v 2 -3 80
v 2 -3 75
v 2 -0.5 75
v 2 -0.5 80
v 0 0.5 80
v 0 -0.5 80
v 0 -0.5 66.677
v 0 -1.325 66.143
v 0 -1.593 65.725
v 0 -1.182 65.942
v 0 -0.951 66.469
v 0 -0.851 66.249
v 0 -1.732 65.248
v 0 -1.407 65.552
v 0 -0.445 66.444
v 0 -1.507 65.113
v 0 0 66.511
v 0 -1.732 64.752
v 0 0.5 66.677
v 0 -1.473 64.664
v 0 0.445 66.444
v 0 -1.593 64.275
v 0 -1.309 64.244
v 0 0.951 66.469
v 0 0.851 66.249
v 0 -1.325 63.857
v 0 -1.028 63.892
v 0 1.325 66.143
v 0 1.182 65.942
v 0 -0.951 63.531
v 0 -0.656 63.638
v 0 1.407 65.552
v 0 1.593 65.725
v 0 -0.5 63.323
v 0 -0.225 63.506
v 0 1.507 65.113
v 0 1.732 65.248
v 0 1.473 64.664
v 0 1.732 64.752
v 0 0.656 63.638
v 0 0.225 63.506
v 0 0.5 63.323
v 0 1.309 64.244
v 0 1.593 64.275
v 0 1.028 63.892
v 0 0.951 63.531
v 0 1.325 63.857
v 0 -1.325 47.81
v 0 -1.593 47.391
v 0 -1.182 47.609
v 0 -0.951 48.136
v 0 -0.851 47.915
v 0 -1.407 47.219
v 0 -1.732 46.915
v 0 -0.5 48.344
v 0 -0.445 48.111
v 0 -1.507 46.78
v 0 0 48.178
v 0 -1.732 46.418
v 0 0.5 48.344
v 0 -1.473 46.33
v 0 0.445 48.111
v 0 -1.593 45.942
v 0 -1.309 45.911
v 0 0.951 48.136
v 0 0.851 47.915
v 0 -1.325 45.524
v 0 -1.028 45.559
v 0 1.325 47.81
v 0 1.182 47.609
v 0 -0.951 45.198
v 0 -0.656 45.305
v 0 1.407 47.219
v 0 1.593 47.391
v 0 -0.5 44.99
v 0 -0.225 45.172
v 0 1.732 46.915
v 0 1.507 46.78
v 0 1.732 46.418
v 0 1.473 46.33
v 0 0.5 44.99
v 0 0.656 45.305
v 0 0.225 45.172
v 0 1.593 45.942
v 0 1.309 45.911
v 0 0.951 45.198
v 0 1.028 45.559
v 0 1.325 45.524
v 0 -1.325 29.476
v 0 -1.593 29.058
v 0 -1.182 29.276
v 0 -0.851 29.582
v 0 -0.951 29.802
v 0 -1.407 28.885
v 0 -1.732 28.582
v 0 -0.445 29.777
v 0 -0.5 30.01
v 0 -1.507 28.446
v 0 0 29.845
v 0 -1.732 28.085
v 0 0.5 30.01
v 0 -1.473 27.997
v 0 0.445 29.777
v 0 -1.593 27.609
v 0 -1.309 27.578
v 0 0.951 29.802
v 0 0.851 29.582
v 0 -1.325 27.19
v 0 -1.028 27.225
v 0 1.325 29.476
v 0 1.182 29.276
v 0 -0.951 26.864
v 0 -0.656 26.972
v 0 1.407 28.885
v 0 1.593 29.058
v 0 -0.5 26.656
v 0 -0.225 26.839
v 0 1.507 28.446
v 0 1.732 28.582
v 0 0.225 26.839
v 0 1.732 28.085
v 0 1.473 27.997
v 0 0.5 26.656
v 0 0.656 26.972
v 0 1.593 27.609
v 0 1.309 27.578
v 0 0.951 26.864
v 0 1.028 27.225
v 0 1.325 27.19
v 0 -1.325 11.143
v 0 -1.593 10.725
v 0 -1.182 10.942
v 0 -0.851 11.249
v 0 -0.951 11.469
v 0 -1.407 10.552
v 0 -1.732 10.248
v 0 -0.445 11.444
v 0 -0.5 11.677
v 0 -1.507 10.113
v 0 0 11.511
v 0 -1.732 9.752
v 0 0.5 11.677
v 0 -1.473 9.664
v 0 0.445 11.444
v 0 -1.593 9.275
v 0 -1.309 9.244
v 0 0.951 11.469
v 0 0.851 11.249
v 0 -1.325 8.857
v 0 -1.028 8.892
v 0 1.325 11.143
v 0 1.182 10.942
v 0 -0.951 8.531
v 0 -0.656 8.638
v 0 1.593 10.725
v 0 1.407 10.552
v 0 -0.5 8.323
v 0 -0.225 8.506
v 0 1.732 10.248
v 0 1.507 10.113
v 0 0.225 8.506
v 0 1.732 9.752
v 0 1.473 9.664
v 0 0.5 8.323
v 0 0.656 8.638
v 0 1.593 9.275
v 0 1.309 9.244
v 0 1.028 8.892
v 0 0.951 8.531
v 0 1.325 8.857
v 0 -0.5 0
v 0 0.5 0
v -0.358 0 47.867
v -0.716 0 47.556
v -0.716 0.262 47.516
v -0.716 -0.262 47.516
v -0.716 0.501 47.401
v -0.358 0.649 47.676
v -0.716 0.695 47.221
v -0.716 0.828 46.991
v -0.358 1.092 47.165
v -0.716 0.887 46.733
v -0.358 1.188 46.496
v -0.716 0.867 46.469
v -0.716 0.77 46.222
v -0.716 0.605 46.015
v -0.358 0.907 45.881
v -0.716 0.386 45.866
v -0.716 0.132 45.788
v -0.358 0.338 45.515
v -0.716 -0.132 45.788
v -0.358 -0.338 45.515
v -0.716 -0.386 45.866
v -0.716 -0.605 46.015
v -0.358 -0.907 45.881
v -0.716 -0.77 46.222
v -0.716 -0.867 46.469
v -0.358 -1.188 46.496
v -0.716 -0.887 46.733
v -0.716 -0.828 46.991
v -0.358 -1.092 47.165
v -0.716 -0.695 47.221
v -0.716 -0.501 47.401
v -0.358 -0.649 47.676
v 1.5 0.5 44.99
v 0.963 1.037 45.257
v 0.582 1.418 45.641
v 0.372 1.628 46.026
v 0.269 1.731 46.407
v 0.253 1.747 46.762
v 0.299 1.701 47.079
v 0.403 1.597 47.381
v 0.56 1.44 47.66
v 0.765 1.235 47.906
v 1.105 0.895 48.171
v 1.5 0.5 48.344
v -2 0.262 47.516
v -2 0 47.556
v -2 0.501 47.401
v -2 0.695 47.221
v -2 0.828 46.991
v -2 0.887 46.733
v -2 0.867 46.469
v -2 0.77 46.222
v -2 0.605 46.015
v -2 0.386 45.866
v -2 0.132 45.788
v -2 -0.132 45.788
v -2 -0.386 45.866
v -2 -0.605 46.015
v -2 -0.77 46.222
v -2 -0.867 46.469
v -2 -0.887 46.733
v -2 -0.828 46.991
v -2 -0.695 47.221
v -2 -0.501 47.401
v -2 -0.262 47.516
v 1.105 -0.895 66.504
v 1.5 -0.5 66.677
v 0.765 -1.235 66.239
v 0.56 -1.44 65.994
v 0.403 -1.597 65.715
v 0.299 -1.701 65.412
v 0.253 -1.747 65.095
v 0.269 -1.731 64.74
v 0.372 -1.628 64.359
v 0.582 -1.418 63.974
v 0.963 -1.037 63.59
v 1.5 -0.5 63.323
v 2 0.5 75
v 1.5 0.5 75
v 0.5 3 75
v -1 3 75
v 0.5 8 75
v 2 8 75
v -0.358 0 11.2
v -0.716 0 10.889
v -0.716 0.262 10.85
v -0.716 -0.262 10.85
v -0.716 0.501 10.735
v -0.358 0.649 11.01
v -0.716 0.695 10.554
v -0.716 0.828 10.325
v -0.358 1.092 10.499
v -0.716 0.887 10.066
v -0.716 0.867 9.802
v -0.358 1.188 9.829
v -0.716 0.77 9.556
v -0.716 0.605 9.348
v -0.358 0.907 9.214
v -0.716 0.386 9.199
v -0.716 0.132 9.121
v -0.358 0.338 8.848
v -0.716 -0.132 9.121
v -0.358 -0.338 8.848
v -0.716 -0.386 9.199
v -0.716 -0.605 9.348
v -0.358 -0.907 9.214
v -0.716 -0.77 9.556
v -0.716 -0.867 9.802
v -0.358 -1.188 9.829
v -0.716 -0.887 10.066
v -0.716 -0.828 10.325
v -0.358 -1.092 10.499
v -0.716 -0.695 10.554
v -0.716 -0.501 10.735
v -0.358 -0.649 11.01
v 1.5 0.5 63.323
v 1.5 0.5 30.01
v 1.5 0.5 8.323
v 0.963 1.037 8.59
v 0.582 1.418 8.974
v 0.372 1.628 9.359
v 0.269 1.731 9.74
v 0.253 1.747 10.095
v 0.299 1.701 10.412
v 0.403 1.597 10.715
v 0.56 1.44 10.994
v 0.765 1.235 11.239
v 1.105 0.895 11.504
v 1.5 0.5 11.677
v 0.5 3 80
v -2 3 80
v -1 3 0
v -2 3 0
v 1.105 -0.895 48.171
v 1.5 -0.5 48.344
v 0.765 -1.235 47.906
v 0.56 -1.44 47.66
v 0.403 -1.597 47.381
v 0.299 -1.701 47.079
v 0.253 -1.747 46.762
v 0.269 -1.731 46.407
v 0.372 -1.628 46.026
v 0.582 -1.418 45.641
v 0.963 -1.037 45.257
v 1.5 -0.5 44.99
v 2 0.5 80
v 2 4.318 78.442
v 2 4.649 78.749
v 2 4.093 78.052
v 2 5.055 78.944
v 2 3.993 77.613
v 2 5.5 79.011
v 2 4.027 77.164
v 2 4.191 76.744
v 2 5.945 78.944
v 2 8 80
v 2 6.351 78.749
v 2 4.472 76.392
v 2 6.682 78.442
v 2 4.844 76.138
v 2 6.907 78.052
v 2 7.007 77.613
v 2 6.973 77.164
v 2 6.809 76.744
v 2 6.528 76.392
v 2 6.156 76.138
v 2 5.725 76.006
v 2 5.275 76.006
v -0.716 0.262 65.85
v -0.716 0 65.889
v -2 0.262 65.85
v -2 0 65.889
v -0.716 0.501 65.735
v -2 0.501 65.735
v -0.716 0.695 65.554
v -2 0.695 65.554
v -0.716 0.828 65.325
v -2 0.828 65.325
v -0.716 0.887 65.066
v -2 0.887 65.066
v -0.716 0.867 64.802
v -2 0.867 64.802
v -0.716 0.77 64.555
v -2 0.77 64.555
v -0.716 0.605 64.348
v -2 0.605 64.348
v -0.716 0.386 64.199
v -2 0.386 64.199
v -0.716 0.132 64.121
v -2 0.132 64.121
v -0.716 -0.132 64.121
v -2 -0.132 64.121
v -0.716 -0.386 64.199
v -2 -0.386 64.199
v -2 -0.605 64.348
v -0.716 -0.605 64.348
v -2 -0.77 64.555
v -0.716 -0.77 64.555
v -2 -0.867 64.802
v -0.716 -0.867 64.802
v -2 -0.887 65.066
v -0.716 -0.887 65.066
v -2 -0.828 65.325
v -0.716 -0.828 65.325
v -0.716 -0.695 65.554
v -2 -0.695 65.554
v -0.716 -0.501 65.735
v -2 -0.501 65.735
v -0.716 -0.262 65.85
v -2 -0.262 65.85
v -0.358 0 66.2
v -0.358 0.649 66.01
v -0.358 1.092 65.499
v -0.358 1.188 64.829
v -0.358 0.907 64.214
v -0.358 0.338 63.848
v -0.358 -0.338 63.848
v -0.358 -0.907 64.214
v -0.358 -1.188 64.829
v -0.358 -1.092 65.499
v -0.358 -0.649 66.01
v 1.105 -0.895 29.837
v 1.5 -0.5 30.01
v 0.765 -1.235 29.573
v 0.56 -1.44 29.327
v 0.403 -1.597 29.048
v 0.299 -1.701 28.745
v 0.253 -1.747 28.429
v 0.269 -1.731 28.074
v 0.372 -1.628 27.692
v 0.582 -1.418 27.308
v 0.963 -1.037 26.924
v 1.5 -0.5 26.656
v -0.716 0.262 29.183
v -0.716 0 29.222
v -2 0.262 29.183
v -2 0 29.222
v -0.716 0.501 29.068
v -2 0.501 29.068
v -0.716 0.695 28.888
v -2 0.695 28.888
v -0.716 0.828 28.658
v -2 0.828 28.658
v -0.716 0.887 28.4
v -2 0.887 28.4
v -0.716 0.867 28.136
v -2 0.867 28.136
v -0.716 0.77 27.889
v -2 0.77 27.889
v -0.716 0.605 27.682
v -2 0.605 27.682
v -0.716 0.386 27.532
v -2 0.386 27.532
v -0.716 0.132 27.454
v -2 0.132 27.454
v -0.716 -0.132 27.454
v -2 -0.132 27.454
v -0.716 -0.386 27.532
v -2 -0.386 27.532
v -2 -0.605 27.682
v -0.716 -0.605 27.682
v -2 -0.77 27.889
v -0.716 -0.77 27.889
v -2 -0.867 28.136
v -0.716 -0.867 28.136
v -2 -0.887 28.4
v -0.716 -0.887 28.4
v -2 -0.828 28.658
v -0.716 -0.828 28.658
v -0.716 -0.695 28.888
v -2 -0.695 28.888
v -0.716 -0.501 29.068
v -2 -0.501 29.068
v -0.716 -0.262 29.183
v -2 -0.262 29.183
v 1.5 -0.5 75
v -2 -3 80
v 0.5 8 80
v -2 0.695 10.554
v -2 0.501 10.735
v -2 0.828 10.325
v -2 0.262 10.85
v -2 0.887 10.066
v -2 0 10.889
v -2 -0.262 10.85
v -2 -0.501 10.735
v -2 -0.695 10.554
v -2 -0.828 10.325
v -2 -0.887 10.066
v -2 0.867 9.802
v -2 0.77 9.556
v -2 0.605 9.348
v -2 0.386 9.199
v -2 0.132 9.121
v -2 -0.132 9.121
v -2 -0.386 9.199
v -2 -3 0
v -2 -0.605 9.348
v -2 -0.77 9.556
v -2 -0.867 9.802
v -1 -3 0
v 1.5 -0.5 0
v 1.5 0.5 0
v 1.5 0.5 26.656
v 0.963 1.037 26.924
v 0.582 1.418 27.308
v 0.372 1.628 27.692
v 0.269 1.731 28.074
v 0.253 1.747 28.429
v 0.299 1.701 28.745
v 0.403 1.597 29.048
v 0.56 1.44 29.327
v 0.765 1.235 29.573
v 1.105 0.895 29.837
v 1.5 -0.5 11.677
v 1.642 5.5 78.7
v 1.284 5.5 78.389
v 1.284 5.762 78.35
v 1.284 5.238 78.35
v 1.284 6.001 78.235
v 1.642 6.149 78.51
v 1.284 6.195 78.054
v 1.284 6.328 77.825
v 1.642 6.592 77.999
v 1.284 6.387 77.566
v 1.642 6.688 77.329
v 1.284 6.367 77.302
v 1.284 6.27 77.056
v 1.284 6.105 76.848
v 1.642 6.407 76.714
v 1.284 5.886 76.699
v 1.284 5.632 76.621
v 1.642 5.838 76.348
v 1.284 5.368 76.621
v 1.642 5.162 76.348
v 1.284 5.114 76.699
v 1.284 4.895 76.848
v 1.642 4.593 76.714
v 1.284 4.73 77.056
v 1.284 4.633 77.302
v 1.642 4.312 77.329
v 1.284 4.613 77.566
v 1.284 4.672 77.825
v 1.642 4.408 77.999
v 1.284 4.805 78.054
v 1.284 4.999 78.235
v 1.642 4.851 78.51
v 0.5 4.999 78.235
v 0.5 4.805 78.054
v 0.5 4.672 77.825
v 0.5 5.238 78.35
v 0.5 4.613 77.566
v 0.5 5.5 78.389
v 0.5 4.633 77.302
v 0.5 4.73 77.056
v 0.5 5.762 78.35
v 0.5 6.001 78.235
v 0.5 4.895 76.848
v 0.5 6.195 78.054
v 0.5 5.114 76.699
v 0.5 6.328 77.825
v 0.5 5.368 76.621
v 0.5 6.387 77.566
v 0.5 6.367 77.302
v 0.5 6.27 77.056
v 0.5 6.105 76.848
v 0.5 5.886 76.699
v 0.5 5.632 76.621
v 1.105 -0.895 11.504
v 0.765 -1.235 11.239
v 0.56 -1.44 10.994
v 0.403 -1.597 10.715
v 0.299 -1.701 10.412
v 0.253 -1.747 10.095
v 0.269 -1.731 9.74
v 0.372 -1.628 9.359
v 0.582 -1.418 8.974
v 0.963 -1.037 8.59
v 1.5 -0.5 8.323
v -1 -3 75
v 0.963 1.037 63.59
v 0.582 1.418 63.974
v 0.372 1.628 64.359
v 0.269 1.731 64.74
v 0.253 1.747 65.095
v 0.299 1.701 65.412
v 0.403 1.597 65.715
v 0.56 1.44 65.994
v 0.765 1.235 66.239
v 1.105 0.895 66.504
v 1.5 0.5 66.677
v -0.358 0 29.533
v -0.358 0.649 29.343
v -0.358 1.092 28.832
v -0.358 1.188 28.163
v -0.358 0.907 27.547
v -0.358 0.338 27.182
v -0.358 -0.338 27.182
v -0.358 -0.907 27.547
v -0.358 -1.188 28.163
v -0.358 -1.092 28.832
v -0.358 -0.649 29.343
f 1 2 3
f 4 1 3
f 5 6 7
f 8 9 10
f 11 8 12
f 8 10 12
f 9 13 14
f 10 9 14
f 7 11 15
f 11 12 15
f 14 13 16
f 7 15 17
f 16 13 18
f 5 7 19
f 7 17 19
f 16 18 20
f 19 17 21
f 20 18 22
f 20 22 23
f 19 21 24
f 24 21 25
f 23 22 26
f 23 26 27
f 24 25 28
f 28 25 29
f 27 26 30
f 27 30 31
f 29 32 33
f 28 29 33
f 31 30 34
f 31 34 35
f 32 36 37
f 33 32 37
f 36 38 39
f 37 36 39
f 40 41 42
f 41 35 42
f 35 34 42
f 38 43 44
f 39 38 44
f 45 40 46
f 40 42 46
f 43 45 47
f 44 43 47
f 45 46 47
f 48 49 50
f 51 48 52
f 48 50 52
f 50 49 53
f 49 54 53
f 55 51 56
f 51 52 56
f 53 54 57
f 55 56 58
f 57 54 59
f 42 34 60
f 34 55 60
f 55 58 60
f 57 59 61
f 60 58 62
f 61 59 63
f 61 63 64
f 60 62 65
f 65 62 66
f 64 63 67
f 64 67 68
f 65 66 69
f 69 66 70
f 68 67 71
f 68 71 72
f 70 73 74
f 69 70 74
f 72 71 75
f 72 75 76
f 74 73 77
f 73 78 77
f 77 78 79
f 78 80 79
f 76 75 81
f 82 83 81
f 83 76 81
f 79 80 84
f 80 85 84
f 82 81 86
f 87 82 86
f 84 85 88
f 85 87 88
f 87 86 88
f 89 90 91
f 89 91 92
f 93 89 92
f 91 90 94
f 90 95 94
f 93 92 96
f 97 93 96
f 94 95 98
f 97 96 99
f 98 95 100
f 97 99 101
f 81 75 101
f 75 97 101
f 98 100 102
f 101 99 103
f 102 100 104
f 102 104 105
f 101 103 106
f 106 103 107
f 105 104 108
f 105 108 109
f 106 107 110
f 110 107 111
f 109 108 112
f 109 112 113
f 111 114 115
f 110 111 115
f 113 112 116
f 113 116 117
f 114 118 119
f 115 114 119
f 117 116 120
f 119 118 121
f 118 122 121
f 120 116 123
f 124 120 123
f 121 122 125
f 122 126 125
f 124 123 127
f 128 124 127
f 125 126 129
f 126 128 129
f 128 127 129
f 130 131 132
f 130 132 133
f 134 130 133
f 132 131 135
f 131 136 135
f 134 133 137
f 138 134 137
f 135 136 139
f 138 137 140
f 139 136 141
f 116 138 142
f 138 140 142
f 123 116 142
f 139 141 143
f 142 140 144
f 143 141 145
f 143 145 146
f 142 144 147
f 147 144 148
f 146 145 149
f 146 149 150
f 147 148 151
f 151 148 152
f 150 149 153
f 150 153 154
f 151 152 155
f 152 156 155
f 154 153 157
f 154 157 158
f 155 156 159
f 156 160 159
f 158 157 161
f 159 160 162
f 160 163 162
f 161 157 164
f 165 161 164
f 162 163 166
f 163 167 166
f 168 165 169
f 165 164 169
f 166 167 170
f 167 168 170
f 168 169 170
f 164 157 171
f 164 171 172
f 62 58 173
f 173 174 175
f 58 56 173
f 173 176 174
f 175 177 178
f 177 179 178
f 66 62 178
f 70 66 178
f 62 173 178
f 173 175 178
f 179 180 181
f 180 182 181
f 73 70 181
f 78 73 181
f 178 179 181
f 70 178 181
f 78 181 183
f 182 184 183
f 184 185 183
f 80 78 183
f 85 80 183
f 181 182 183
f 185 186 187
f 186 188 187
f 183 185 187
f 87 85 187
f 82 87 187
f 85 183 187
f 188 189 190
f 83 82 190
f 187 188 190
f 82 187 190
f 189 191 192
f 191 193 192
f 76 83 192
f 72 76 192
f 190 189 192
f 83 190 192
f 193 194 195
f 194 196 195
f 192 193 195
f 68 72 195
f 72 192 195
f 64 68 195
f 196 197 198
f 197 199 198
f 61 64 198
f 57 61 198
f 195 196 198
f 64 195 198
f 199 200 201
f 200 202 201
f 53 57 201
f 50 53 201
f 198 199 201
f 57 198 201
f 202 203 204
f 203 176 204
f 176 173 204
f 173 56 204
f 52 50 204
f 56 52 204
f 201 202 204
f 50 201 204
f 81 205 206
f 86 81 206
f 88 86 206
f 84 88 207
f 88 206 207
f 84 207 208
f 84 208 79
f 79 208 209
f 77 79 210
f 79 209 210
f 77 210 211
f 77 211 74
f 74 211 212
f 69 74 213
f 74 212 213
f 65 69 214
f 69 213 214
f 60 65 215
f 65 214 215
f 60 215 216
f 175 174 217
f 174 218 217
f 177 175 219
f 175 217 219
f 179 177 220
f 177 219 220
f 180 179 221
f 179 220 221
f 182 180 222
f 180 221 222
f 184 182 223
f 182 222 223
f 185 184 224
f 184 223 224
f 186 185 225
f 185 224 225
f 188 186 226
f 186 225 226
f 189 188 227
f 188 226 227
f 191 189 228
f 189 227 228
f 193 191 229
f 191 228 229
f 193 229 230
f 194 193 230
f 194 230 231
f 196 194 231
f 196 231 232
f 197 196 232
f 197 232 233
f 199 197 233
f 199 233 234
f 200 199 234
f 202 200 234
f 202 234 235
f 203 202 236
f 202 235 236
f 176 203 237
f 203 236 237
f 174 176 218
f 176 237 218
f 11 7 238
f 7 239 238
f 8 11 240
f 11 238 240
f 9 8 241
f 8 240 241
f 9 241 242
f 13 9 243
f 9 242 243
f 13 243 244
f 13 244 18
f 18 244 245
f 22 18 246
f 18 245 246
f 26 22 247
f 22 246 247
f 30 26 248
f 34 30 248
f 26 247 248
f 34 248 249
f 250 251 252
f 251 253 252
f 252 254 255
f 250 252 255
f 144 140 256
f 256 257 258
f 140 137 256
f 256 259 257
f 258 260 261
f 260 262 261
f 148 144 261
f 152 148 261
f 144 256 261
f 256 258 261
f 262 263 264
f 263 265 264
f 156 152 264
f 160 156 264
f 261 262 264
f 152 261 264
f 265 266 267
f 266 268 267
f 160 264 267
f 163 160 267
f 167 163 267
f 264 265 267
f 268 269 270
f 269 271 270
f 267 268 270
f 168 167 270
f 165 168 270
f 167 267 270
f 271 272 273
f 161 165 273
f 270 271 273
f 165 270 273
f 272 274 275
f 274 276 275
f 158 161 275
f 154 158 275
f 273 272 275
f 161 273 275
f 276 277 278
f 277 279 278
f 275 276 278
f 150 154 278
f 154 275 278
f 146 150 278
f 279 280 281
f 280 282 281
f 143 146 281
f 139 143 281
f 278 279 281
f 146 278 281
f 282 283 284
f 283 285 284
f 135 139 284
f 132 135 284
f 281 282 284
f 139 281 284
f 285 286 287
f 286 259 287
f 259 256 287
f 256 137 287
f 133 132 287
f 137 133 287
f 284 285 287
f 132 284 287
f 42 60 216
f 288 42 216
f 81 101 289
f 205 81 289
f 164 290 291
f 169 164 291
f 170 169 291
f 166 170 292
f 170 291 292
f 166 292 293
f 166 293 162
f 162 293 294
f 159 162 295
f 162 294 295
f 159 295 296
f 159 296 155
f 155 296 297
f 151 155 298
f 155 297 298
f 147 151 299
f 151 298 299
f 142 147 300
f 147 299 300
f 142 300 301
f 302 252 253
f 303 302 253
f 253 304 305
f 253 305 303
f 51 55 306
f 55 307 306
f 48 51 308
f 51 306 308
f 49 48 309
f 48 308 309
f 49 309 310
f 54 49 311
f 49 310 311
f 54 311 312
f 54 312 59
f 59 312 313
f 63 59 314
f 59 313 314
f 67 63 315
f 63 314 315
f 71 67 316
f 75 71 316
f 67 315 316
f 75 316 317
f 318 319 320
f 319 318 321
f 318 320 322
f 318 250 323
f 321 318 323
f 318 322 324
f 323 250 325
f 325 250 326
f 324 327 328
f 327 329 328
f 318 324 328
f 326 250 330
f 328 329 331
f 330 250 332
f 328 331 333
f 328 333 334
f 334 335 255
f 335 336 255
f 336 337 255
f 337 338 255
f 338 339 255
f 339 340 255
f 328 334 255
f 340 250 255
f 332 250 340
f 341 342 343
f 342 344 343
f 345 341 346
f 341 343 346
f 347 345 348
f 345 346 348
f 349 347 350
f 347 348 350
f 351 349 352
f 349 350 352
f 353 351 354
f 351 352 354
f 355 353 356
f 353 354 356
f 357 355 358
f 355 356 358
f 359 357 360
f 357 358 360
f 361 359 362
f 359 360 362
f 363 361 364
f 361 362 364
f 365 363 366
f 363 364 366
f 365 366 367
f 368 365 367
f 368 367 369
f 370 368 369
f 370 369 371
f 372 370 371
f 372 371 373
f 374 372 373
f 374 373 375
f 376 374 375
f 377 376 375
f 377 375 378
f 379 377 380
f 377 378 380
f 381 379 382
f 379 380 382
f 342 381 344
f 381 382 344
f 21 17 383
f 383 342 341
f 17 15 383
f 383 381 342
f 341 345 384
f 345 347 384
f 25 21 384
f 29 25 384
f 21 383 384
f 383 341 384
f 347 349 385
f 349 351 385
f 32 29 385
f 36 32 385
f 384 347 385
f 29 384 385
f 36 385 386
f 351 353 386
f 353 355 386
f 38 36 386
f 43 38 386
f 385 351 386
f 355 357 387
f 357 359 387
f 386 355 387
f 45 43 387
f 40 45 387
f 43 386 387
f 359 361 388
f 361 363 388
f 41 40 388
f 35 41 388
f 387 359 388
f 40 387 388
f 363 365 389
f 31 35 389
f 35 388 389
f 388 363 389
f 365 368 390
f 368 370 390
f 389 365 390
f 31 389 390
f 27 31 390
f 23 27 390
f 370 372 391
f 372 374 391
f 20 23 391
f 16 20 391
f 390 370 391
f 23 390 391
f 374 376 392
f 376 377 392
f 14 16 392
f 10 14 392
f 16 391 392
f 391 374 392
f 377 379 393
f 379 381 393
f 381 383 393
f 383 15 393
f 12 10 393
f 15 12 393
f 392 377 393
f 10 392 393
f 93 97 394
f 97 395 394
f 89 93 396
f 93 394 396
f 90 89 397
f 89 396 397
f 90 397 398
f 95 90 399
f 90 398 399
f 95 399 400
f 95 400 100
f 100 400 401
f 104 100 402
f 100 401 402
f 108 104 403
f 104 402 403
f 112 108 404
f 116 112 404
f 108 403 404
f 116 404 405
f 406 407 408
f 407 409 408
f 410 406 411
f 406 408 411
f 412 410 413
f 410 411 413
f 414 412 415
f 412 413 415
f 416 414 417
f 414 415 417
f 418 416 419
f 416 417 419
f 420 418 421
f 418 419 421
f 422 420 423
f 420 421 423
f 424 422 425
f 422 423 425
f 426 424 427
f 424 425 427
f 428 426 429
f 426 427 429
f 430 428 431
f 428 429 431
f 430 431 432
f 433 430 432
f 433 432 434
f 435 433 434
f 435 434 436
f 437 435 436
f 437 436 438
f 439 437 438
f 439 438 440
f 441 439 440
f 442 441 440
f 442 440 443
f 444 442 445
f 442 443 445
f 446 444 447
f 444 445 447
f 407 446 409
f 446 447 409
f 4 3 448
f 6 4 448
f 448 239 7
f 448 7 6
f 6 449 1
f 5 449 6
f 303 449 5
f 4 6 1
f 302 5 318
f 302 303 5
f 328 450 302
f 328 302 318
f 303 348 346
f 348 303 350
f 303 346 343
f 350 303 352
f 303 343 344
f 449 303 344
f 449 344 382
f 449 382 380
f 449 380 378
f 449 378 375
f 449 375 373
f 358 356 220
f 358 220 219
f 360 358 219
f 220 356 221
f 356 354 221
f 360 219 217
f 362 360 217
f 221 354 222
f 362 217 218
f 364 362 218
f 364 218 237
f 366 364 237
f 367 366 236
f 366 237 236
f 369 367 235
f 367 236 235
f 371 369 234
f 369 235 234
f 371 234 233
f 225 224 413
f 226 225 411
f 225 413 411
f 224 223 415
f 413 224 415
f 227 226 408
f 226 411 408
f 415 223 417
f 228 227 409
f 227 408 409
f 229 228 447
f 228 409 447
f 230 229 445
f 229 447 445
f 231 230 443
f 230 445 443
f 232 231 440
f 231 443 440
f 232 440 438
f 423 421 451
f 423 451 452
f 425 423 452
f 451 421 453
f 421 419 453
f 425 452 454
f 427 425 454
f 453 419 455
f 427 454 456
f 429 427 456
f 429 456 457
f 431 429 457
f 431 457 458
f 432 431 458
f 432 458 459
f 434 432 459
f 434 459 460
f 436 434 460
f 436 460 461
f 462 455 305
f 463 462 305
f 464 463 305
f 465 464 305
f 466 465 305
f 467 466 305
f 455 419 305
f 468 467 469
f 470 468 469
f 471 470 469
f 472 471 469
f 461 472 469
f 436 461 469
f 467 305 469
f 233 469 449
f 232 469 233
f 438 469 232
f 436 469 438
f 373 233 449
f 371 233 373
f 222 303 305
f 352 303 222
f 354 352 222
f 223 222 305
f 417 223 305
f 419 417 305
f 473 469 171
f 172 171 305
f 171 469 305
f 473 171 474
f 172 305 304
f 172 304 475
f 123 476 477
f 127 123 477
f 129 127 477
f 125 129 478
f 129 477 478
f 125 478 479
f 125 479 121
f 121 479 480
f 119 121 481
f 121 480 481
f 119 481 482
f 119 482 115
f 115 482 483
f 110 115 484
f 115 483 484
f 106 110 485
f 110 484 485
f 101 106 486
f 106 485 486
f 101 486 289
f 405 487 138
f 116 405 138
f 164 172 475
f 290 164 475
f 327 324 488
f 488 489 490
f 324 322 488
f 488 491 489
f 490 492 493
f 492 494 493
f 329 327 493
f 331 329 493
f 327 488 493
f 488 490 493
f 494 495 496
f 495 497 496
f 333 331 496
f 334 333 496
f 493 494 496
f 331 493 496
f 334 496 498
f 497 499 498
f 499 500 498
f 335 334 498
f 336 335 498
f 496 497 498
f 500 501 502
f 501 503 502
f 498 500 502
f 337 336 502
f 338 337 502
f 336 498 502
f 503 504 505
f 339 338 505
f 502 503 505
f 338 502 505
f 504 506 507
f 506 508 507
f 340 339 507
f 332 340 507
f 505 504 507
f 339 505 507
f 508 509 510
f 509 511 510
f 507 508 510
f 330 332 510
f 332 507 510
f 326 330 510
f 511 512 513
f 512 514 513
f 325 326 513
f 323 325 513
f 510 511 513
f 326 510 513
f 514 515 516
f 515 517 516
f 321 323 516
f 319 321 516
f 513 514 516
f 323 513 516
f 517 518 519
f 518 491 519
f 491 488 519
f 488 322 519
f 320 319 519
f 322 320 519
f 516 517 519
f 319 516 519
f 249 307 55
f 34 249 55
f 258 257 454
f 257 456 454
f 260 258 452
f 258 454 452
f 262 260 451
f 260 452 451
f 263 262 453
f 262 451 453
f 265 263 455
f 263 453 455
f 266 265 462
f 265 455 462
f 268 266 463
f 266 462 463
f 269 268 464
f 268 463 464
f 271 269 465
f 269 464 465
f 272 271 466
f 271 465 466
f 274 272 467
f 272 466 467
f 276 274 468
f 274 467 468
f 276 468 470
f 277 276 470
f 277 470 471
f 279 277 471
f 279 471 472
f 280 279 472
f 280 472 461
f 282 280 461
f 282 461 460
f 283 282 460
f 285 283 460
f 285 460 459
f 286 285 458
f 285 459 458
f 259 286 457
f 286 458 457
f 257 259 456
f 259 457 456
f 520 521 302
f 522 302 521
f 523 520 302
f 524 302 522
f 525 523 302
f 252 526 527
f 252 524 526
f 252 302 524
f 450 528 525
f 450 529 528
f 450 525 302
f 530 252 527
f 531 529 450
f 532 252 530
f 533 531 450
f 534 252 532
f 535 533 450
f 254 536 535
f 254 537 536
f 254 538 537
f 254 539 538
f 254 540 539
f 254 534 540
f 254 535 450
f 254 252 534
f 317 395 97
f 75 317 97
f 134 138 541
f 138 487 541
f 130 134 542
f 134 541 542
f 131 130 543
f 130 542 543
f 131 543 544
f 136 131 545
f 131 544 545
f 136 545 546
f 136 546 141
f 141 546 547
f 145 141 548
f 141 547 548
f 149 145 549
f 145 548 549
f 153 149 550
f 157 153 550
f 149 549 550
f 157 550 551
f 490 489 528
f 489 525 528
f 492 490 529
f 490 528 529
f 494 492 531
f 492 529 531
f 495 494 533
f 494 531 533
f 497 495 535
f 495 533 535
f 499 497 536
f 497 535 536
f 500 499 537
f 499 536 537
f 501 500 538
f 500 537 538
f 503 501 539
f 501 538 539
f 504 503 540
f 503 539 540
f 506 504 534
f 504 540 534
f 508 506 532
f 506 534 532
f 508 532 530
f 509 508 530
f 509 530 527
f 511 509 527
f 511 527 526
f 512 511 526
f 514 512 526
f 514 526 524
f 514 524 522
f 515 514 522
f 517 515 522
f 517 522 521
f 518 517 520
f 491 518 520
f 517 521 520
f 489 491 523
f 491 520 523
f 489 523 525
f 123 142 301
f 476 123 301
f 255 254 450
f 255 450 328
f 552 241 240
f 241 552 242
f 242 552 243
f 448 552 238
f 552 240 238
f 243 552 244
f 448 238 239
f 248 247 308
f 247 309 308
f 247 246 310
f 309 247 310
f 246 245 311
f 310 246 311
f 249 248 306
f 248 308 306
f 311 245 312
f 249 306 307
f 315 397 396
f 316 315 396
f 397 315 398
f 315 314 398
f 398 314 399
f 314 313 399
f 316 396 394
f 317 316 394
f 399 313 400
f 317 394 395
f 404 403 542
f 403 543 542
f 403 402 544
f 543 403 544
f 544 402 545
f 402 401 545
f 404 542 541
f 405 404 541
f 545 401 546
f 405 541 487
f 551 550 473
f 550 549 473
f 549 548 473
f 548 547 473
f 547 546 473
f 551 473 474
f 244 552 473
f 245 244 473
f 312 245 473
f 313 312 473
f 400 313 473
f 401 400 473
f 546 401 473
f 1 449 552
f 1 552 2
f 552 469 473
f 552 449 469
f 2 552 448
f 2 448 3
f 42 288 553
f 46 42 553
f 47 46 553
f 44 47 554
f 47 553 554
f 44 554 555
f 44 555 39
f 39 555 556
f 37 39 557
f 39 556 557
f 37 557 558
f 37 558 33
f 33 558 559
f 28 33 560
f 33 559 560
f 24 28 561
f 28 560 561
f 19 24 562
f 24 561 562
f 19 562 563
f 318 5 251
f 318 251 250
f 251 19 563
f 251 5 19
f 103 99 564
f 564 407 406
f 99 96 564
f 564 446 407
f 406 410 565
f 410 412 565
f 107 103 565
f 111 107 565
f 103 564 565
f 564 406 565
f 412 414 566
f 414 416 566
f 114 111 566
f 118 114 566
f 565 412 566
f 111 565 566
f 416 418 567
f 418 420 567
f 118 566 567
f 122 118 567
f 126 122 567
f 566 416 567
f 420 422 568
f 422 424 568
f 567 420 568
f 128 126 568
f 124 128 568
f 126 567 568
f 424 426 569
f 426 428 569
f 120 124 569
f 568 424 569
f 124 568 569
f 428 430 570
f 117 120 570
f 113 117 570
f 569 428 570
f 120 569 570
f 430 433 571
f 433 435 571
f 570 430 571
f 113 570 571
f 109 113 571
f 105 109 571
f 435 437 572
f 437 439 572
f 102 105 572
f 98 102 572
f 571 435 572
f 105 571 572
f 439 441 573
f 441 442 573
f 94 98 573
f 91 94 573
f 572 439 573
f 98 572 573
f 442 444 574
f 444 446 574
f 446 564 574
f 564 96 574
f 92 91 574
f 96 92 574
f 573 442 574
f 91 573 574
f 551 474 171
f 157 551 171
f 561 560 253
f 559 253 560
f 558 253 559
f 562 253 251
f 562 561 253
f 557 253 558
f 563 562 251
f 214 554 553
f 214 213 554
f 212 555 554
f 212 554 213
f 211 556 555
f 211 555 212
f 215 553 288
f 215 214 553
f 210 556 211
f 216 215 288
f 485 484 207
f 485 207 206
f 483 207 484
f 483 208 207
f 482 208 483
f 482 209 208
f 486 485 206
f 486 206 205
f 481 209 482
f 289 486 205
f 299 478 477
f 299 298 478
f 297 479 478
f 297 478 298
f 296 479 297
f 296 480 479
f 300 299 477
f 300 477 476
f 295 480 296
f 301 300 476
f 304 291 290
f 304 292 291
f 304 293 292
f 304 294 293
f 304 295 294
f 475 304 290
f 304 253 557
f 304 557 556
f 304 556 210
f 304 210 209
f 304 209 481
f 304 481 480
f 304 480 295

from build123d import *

# Parameters (mm, degrees)
BOSS_EXTRUDE1_DEPTH                            = 75
SKETCH5_R                                      = 1.75
CUT_EXTRUDE1_DEPTH                             = 2
CSK_FOR_0_FLAT_HEAD_MACHINE_SCREW2_D           = 1.778
CSK_FOR_0_FLAT_HEAD_MACHINE_SCREW2_DEPTH       = 3.302
CSK_FOR_0_FLAT_HEAD_MACHINE_SCREW2_CSINK_D     = 3.0226
CSK_FOR_0_FLAT_HEAD_MACHINE_SCREW2_CSINK_ANGLE = 82
CSK_FOR_0_FLAT_HEAD_MACHINE_SCREW2_TIP         = 0.53416509
CHAMFER1_SIZE                                  = 3
SKETCH6_W                                      = 1.5
SKETCH6_H                                      = 5
BOSS_EXTRUDE2_DEPTH                            = 5
CSK_FOR_0_FLAT_HEAD_MACHINE_SCREW1_D           = 1.778
CSK_FOR_0_FLAT_HEAD_MACHINE_SCREW1_DEPTH       = 3.302
CSK_FOR_0_FLAT_HEAD_MACHINE_SCREW1_CSINK_D     = 3.0226
CSK_FOR_0_FLAT_HEAD_MACHINE_SCREW1_CSINK_ANGLE = 82
CSK_FOR_0_FLAT_HEAD_MACHINE_SCREW1_TIP         = 0.53416509


with BuildPart() as part:
    # Sketch1 → Boss-Extrude1 (new body)
    with BuildSketch(Plane.XY):
        Polygon((-2, -3), (2, -3), (2, -0.5), (0, -0.5), (0, 0.5), (2, 0.5), (2, 3), (-2, 3), align=None)
    extrude(amount=BOSS_EXTRUDE1_DEPTH)

    # Sketch5 → Cut-Extrude1 (cut)
    with BuildSketch(Plane(origin=(2, 0, 0), x_dir=(0, 0, -1), z_dir=(1, 0, 0))):
        with Locations((-65, 0)):
            Circle(SKETCH5_R)
        with Locations((-46.66667, 0)):
            Circle(SKETCH5_R)
        with Locations((-28.33334, 0)):
            Circle(SKETCH5_R)
        with Locations((-10.00001, 0)):
            Circle(SKETCH5_R)
    extrude(amount=-CUT_EXTRUDE1_DEPTH, mode=Mode.SUBTRACT)

    # CSK for #0 Flat Head Machine Screw2
    with Locations(Plane(origin=(0, 0, 0), x_dir=(0, 0, -1), z_dir=(1, 0, 0))):
        with Locations((-65, 0), (-10.00001, 0), (-46.66667, 0), (-28.33334, 0)):
            CounterSinkHole(CSK_FOR_0_FLAT_HEAD_MACHINE_SCREW2_D / 2, CSK_FOR_0_FLAT_HEAD_MACHINE_SCREW2_CSINK_D / 2, depth=CSK_FOR_0_FLAT_HEAD_MACHINE_SCREW2_DEPTH, counter_sink_angle=CSK_FOR_0_FLAT_HEAD_MACHINE_SCREW2_CSINK_ANGLE)
            with Locations((0, 0, -(CSK_FOR_0_FLAT_HEAD_MACHINE_SCREW2_DEPTH + CSK_FOR_0_FLAT_HEAD_MACHINE_SCREW2_TIP / 2))):  # 118° drill point
                Cone(0, CSK_FOR_0_FLAT_HEAD_MACHINE_SCREW2_D / 2, CSK_FOR_0_FLAT_HEAD_MACHINE_SCREW2_TIP, mode=Mode.SUBTRACT)

    # Chamfer1
    # the kernel refuses this chamfer: 3 mm, written as the material it takes off along each edge
    with BuildSketch(Plane(origin=(2, -3, -7.715048964), x_dir=(-0.9996219169112968, -0.027495876610586348, 0), z_dir=(0, 0, 1))) as chamfer1_piece_1:
        Polygon((CHAMFER1_SIZE * 0.999621916911, -CHAMFER1_SIZE * 0.0274958766106), (-CHAMFER1_SIZE * 0.0274958766106, -CHAMFER1_SIZE * 0.999621916911), (0, 0), align=None)
    extrude(amount=90.430097928, mode=Mode.SUBTRACT)
    with BuildSketch(Plane(origin=(2, 3, -7.715048964), x_dir=(-0.9996219169112968, 0.027495876610586348, 0), z_dir=(0, 0, 1))) as chamfer1_piece_2:
        Polygon((CHAMFER1_SIZE * 0.999621916911, CHAMFER1_SIZE * 0.0274958766106), (-CHAMFER1_SIZE * 0.0274958766106, CHAMFER1_SIZE * 0.999621916911), (0, 0), align=None)
    extrude(amount=90.430097928, mode=Mode.SUBTRACT)

    # Sketch6 → Boss-Extrude2 (add)
    with BuildSketch(Plane.XY.offset(75)):
        Polygon((2, 0.5), (2, 3), (0.5, 3), (-2, 3), (-2, -3), (2, -3), (2, -0.5), (0, -0.5), (0, 0.5), align=None)
        with Locations((1.25, 5.5)):
            Rectangle(SKETCH6_W, SKETCH6_H)
    extrude(amount=BOSS_EXTRUDE2_DEPTH)

    # CSK for #0 Flat Head Machine Screw1
    with Locations(Plane(origin=(2, 0, 0), x_dir=(0, 0, -1), z_dir=(1, 0, 0))):
        with Locations((-77.5, 5.5)):
            CounterSinkHole(CSK_FOR_0_FLAT_HEAD_MACHINE_SCREW1_D / 2, CSK_FOR_0_FLAT_HEAD_MACHINE_SCREW1_CSINK_D / 2, depth=CSK_FOR_0_FLAT_HEAD_MACHINE_SCREW1_DEPTH, counter_sink_angle=CSK_FOR_0_FLAT_HEAD_MACHINE_SCREW1_CSINK_ANGLE)
            with Locations((0, 0, -(CSK_FOR_0_FLAT_HEAD_MACHINE_SCREW1_DEPTH + CSK_FOR_0_FLAT_HEAD_MACHINE_SCREW1_TIP / 2))):  # 118° drill point
                Cone(0, CSK_FOR_0_FLAT_HEAD_MACHINE_SCREW1_D / 2, CSK_FOR_0_FLAT_HEAD_MACHINE_SCREW1_TIP, mode=Mode.SUBTRACT)


solid = part.part
